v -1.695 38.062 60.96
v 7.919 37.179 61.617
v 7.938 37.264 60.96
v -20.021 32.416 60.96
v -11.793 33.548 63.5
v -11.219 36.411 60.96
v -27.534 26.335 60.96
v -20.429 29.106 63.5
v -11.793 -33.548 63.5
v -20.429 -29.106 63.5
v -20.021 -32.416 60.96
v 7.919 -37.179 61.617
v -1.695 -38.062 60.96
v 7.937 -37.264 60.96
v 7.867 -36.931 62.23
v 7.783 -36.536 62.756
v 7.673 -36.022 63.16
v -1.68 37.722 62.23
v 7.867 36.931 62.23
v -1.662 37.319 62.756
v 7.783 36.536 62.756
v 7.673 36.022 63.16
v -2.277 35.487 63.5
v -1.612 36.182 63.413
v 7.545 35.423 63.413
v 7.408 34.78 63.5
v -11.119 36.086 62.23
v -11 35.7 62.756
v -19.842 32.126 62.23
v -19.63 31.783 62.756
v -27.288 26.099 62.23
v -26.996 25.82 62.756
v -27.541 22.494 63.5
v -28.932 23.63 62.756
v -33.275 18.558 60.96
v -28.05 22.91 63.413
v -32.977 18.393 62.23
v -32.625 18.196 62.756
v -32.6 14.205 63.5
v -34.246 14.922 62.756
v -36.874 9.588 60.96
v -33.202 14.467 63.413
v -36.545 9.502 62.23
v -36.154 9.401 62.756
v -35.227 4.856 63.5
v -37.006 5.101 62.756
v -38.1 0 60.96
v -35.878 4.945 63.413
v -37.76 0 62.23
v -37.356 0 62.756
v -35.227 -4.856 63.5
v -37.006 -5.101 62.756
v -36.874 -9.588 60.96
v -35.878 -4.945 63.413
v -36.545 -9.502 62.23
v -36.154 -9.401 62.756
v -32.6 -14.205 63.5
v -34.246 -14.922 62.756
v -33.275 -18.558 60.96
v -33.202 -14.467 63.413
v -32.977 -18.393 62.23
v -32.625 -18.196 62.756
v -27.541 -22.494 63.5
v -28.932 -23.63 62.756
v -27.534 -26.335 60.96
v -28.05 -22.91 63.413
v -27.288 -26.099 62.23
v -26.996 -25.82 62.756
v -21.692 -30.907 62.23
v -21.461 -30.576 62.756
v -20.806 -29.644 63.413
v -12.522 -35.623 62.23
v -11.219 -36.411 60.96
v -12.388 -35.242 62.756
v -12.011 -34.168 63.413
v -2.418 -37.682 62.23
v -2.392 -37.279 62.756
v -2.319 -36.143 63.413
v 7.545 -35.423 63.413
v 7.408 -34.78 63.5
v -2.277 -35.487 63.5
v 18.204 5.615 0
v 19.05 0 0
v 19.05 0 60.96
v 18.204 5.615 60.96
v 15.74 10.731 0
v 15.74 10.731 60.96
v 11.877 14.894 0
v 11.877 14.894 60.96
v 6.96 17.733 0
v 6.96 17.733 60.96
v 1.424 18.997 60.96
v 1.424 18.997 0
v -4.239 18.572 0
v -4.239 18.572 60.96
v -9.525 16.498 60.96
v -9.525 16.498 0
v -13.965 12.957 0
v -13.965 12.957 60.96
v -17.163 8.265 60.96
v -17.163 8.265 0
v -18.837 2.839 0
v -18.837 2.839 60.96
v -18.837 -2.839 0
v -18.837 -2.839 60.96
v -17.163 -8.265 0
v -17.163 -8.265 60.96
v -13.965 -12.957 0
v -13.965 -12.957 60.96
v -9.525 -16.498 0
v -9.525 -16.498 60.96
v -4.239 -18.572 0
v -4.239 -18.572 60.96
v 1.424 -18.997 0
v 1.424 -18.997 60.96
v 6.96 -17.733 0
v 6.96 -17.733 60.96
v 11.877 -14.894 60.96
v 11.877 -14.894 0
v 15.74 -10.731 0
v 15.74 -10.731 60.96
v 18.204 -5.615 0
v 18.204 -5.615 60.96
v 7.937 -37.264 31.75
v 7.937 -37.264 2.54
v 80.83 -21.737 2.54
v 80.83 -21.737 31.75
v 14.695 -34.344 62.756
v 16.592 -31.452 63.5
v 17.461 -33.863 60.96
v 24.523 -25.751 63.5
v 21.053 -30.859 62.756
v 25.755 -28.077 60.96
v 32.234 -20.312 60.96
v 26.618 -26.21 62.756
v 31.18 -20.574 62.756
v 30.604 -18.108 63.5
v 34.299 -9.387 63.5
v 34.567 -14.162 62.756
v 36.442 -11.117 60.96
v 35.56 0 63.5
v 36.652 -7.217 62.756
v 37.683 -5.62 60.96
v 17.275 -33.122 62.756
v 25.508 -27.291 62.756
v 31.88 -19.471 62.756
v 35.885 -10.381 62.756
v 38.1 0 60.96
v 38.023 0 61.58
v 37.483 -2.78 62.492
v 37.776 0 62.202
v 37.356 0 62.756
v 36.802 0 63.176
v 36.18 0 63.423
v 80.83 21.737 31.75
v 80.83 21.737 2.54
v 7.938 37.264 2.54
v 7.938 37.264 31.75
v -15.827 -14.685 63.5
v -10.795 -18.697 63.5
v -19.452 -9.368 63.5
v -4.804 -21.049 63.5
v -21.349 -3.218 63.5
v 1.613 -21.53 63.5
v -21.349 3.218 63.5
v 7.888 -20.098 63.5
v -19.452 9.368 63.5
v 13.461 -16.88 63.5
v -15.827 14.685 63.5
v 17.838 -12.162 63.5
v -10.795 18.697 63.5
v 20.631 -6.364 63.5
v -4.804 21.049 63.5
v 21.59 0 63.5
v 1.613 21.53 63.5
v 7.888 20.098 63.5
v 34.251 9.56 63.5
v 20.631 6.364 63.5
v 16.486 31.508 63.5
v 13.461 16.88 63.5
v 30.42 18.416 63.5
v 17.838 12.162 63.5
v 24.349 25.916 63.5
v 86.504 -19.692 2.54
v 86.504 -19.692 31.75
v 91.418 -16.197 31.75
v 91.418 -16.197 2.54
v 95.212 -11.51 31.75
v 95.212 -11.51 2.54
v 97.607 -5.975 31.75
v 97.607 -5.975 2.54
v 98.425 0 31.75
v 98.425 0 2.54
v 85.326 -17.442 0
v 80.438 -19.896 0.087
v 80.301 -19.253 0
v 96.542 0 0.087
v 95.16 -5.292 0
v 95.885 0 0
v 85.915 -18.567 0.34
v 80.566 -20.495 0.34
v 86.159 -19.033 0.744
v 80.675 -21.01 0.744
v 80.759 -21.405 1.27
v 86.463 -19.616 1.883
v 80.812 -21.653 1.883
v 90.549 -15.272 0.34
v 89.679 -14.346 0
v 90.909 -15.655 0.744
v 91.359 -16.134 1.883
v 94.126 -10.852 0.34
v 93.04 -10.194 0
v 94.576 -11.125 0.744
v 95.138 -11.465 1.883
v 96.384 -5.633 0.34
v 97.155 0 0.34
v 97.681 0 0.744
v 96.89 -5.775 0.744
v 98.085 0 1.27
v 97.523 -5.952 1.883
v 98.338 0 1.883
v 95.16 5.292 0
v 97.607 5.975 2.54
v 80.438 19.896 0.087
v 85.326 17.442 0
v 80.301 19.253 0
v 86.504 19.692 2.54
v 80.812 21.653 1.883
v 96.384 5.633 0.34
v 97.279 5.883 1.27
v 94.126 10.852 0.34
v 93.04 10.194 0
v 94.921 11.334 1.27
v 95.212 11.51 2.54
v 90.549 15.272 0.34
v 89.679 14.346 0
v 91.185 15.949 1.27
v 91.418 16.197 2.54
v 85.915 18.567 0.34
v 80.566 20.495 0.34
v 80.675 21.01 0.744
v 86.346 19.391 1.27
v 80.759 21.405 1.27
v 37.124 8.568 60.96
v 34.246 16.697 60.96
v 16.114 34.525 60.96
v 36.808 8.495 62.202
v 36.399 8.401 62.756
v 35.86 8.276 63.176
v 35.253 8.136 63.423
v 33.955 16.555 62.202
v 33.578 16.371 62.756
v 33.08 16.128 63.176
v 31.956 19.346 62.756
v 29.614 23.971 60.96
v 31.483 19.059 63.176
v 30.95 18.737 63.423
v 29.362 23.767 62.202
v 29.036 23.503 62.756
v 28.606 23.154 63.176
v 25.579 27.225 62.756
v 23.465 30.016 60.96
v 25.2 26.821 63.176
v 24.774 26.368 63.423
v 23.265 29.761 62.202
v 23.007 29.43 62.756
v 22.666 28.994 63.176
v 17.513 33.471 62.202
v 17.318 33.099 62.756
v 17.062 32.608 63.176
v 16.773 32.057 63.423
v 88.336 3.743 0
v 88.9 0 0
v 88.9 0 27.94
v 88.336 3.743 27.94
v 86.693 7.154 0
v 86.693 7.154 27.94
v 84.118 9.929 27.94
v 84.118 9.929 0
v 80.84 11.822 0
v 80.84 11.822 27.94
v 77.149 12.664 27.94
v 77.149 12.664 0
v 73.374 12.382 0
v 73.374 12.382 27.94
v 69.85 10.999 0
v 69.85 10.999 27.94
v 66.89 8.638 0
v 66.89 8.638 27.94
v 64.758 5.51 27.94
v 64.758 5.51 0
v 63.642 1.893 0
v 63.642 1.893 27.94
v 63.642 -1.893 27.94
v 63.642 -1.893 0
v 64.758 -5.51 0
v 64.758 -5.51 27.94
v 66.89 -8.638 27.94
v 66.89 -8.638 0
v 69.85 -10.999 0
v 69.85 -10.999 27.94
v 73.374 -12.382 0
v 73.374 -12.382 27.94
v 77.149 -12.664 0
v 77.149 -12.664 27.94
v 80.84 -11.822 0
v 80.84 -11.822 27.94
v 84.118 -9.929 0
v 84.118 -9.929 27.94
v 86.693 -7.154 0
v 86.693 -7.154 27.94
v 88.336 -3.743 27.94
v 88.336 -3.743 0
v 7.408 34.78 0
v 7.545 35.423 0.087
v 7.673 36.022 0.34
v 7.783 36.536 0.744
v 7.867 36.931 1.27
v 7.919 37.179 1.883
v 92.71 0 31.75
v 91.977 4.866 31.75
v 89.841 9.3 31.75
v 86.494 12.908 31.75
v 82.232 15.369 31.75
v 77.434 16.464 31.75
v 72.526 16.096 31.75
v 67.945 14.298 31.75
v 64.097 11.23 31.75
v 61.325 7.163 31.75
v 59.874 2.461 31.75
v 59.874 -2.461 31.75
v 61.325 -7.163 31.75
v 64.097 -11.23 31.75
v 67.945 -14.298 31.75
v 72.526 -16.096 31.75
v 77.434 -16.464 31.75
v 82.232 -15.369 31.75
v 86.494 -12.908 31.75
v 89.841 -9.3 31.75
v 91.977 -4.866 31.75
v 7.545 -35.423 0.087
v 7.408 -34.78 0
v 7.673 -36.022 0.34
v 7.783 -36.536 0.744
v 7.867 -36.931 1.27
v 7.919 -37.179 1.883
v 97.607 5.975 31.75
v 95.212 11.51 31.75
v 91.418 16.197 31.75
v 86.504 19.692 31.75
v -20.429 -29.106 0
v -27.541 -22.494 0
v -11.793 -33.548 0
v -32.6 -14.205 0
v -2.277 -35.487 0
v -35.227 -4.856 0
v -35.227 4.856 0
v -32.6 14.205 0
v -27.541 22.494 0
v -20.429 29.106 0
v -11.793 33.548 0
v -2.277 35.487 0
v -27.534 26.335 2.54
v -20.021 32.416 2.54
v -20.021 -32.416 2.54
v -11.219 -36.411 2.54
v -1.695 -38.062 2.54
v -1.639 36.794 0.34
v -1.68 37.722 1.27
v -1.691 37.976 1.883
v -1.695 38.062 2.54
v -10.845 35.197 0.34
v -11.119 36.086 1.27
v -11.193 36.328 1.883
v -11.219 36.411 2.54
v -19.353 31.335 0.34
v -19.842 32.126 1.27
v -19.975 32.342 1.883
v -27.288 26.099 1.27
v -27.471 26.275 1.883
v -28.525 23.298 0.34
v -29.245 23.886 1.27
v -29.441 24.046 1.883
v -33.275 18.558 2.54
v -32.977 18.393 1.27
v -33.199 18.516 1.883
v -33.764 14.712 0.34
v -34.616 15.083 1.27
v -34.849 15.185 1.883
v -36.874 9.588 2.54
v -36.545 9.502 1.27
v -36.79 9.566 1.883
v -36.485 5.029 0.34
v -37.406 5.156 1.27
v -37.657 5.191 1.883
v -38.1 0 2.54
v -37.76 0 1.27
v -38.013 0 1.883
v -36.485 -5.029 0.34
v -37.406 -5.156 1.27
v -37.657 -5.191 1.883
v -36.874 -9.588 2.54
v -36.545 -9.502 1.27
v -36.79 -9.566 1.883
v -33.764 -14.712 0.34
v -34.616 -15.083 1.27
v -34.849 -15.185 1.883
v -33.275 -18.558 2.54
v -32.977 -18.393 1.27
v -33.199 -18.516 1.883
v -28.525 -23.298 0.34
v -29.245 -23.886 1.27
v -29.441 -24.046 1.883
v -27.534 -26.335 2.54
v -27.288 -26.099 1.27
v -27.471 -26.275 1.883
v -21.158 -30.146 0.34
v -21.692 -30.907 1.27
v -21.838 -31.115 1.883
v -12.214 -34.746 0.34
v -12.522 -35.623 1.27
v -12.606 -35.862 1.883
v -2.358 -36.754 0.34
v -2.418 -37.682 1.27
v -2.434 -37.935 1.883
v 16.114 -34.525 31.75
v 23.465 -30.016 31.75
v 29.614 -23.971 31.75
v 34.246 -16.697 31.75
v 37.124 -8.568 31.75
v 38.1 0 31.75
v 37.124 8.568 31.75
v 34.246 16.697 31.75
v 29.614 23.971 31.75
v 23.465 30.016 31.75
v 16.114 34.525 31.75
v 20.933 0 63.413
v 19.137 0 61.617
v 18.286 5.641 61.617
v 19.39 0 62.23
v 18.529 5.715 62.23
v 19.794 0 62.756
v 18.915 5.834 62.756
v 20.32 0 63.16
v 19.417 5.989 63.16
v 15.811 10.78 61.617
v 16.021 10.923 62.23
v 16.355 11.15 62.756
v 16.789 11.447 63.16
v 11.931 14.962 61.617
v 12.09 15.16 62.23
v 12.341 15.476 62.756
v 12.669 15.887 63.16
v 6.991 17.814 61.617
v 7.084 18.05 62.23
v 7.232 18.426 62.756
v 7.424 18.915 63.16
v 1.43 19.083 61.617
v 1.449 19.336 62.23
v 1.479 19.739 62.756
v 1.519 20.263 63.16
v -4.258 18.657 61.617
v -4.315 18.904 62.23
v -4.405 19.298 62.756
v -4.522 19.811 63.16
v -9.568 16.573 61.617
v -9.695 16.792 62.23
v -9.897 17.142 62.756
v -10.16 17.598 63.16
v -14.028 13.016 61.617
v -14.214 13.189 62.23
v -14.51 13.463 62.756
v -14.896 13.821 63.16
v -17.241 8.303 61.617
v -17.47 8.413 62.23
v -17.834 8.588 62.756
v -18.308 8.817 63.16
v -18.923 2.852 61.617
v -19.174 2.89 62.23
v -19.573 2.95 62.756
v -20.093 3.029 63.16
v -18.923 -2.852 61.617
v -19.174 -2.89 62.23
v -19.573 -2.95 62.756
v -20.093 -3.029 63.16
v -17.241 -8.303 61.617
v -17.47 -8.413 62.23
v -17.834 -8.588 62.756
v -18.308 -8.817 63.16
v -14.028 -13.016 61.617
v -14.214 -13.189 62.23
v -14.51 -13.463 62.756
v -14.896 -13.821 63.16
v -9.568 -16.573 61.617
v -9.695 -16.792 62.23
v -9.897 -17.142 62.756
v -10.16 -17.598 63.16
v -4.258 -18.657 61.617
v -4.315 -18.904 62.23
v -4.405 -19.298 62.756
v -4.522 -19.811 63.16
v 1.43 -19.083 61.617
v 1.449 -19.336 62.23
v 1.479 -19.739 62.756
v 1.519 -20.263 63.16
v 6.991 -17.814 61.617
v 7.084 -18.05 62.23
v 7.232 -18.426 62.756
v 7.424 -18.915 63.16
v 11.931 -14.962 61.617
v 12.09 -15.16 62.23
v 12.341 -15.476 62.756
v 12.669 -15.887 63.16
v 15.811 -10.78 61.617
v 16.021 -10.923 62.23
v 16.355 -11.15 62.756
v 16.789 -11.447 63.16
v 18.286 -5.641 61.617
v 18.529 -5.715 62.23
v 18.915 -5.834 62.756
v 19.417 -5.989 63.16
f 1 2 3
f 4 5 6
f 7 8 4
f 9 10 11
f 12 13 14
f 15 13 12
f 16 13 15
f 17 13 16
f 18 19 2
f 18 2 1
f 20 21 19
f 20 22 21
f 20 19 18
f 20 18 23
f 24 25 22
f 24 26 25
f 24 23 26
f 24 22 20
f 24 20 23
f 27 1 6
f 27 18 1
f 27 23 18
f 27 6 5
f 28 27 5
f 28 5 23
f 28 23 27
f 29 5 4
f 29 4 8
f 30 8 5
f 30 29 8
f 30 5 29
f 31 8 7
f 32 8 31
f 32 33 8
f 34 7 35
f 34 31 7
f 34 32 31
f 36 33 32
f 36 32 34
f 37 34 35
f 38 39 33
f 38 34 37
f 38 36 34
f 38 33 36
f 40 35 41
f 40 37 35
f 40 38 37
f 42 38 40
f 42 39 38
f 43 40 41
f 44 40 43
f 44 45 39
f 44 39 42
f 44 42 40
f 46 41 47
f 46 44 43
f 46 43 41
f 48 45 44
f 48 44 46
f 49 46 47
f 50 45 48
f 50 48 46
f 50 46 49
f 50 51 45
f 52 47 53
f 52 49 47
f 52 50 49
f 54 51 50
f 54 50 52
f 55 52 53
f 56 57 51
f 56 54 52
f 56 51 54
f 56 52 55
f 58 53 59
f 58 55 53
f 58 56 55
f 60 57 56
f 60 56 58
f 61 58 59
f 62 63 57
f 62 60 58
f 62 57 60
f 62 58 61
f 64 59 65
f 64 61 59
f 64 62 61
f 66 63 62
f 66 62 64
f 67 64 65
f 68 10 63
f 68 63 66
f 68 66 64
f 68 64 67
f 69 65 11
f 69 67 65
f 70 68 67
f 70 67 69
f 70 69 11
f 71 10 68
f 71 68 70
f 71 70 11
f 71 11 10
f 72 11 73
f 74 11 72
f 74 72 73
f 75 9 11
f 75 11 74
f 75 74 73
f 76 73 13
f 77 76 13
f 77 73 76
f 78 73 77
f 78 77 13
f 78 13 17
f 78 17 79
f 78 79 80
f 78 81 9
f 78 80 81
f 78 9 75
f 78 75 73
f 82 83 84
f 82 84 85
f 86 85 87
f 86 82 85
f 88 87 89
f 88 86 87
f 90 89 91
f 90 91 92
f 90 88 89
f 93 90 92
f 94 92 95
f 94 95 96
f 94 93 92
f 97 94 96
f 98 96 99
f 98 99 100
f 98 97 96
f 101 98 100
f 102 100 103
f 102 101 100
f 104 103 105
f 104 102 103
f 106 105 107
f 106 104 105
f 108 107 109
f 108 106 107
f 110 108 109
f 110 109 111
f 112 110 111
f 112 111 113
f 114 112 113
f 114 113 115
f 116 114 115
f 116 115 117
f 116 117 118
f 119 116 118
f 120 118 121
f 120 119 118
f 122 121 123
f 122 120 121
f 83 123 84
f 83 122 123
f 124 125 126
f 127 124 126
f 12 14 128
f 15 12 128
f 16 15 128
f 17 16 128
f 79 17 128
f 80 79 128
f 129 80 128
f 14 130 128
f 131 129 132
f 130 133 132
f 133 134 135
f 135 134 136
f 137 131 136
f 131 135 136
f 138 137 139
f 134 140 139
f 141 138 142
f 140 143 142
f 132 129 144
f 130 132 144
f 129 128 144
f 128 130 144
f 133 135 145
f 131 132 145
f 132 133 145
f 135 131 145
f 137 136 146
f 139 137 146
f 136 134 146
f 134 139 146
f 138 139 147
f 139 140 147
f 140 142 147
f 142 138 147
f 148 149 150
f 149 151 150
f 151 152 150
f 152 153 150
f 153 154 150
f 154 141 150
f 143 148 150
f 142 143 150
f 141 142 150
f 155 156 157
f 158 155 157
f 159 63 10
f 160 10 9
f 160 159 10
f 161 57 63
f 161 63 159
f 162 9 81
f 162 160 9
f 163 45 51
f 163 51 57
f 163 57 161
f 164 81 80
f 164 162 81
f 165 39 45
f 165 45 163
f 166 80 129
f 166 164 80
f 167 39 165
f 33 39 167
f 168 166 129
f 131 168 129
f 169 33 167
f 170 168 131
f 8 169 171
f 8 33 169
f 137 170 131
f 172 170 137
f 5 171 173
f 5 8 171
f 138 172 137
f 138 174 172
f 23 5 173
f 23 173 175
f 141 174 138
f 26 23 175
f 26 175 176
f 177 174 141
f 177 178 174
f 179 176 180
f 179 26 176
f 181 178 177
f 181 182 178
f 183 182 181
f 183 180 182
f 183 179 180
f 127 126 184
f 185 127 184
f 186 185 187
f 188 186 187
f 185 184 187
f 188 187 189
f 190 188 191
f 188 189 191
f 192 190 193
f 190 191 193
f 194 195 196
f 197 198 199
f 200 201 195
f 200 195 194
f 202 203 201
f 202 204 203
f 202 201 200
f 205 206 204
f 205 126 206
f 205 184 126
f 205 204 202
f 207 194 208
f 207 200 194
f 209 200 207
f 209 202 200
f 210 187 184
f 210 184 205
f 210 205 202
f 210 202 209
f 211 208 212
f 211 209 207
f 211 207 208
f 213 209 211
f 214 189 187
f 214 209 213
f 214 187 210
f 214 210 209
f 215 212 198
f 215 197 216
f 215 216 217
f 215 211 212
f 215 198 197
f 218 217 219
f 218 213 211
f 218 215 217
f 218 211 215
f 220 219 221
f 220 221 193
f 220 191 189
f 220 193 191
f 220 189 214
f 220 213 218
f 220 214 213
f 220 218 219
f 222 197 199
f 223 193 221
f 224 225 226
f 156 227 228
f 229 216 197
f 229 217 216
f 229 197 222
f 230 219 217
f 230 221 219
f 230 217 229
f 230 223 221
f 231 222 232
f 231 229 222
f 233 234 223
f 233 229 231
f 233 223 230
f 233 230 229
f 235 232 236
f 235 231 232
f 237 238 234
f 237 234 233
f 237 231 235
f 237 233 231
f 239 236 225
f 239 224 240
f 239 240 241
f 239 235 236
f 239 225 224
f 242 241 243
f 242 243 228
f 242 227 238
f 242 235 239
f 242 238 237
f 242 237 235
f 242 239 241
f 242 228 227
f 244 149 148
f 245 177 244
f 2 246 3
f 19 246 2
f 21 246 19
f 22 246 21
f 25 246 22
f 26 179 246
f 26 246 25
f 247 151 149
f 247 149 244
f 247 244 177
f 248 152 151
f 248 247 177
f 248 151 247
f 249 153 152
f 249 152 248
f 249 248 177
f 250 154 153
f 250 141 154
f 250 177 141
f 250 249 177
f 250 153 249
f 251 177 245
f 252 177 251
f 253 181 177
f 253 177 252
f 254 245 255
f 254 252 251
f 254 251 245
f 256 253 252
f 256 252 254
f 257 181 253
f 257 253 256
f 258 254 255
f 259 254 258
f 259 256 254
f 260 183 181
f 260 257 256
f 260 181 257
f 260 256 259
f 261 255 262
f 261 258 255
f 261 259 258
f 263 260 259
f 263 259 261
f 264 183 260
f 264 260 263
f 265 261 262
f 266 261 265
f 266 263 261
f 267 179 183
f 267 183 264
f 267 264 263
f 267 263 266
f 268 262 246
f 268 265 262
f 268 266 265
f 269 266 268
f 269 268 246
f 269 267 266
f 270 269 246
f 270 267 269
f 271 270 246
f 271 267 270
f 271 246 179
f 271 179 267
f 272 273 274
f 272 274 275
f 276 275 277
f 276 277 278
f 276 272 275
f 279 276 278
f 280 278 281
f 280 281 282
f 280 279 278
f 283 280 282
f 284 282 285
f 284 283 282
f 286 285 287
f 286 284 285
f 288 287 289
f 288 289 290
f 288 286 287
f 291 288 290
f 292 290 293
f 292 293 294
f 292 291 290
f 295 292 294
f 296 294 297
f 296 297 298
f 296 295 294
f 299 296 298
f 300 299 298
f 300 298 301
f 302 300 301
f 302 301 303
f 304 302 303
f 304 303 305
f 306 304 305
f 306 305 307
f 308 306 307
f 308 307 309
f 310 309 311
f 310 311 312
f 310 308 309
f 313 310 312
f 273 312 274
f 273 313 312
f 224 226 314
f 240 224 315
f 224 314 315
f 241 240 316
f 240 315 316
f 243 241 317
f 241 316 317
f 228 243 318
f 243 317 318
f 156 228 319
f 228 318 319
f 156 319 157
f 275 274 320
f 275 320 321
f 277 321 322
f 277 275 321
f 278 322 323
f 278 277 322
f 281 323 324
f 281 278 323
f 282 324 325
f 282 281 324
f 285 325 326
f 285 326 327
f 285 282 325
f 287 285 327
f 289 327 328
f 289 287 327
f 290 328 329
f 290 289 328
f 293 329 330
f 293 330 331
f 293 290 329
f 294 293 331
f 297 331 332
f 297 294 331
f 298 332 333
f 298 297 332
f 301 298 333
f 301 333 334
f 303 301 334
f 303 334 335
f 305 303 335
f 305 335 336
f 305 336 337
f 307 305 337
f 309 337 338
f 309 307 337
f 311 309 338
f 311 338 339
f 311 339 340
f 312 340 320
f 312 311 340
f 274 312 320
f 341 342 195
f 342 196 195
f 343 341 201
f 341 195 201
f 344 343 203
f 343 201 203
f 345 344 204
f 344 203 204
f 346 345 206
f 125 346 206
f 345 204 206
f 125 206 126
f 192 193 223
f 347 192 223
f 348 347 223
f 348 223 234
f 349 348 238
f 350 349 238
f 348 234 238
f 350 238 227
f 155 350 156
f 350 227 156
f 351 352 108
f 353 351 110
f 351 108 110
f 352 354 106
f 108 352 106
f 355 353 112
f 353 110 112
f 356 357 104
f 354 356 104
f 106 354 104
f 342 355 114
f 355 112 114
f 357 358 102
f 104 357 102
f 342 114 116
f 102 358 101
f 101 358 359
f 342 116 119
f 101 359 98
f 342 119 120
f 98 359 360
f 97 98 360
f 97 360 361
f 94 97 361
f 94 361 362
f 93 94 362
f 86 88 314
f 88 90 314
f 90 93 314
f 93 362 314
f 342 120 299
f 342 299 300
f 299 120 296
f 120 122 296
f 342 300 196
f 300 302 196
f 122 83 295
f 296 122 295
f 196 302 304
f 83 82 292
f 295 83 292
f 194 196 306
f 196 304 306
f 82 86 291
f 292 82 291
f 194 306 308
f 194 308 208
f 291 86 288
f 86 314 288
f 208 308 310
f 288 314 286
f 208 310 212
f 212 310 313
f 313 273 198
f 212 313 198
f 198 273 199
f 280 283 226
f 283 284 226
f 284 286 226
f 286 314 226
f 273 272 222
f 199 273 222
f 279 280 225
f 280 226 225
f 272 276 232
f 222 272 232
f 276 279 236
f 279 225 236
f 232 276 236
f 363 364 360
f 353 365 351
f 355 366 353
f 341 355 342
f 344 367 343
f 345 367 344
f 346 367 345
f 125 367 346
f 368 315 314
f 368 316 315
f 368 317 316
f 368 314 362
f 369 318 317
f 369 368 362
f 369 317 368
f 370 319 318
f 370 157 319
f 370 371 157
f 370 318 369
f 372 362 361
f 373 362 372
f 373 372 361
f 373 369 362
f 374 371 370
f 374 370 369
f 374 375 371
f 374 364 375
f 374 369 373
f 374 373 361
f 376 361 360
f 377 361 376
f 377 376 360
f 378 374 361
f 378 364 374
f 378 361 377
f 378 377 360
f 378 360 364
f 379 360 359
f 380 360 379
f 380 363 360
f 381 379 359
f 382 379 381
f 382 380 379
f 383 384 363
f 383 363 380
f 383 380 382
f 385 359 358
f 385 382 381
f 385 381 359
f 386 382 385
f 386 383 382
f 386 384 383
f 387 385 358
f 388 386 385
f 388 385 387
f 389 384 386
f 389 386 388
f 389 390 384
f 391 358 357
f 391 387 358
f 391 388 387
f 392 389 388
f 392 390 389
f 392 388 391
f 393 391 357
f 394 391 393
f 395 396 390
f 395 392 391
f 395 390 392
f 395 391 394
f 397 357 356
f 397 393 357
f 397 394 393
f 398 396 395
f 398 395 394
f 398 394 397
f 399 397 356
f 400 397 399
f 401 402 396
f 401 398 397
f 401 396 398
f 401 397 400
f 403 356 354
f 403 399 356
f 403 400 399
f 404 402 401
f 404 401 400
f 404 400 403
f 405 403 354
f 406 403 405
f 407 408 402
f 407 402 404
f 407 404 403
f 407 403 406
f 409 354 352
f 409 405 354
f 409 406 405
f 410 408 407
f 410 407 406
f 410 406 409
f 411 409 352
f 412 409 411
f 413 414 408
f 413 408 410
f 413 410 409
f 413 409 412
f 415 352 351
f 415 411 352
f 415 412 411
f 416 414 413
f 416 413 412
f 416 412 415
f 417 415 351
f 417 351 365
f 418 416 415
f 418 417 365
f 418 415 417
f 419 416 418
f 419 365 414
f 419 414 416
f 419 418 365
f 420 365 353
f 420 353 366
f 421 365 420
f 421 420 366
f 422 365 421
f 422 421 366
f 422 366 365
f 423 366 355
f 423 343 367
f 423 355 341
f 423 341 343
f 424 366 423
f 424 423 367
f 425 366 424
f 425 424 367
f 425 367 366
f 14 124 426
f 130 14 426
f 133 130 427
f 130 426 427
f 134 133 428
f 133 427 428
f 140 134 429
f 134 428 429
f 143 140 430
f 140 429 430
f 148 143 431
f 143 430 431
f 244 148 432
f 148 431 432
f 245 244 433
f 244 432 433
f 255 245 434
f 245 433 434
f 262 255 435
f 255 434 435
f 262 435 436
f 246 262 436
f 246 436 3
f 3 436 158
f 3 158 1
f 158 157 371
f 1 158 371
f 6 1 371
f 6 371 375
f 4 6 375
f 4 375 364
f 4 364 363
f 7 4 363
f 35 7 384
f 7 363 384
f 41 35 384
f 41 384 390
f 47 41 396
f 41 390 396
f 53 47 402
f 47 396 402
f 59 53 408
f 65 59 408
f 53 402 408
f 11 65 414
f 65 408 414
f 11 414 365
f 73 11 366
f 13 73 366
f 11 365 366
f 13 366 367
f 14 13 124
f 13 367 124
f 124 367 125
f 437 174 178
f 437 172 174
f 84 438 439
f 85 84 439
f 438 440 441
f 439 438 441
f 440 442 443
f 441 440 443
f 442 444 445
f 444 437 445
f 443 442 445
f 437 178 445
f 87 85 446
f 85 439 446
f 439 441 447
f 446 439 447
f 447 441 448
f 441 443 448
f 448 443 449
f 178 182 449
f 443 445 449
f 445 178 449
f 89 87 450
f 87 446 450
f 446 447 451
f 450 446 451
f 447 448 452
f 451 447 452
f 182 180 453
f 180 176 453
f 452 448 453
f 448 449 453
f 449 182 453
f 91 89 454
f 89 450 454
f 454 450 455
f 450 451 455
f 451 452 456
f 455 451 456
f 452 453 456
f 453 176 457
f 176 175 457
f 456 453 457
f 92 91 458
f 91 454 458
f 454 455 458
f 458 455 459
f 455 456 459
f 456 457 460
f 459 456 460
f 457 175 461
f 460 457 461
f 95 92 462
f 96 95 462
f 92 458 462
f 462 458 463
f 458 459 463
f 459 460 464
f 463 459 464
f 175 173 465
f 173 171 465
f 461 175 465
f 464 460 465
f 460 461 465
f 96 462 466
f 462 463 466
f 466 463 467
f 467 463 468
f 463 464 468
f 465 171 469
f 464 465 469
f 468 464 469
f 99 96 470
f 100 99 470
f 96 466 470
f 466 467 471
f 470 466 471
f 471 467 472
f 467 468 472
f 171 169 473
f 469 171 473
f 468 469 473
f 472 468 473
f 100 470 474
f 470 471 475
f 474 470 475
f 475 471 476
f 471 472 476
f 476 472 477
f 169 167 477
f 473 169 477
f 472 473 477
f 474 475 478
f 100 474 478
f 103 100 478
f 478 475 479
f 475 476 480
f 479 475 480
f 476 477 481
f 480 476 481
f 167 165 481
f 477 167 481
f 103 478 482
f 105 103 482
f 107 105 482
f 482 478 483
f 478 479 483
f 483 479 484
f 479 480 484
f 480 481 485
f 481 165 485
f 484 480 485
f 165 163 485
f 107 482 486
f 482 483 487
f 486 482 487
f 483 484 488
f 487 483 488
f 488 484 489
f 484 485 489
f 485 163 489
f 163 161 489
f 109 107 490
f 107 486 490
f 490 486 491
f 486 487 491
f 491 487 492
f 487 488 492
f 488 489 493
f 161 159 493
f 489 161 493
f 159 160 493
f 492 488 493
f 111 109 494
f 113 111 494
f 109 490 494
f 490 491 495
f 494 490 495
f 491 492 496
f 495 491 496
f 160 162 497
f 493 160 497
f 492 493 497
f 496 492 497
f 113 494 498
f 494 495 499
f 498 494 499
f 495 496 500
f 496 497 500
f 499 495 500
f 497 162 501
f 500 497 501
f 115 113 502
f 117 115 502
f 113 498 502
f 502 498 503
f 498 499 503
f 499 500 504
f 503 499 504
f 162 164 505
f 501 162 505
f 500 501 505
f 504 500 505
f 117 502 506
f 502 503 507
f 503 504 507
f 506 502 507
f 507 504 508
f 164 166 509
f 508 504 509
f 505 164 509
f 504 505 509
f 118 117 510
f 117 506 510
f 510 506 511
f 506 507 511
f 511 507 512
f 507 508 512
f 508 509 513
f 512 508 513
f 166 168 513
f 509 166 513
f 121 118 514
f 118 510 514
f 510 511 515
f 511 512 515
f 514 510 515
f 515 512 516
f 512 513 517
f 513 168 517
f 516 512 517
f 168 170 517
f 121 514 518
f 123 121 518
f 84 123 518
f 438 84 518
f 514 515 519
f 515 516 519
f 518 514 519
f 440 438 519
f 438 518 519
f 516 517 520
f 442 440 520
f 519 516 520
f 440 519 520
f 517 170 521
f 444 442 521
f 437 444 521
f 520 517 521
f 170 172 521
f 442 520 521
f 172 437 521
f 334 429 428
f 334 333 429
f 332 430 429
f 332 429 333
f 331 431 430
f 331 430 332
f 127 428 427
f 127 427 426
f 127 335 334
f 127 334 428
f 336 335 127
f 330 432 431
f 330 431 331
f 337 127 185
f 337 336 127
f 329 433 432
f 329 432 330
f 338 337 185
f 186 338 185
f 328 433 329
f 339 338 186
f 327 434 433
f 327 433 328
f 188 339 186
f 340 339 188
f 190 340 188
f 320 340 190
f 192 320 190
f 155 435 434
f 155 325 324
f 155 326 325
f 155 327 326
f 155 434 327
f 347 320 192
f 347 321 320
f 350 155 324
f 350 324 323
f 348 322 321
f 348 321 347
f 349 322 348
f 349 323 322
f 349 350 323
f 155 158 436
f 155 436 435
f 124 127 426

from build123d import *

# Parameters (mm, degrees)
F0_R     = 19.05
F0_R_2   = 12.7
F1_DEPTH = 31.75
F2_DEPTH = 63.5
F3_R     = 2.54
F4_SIZE  = 3.81


with BuildPart() as f1:
    # F0 (on Top) → F1 (new body)
    with BuildSketch(Plane.XY):
        with BuildLine():
            ThreePointArc((7.9375, -37.2640053369), (29.6144284936, -23.970724332), (38.1, 0))
            ThreePointArc((38.1, 0), (29.6144284936, 23.970724332), (7.9375, 37.2640053369))
            ThreePointArc((7.9375, 37.2640053369), (-38.1, 0), (7.9375, -37.2640053369))
        make_face()
        Circle(F0_R, mode=Mode.SUBTRACT)
        with BuildLine():
            ThreePointArc((7.9375, 37.2640053369), (29.6144284936, 23.970724332), (38.1, 0))
            ThreePointArc((38.1, 0), (29.6144284936, -23.970724332), (7.9375, -37.2640053369))
            Line((7.9375, -37.2640053369), (80.8302083333, -21.7373364465))
            ThreePointArc((80.8302083333, -21.7373364465), (53.975, 0), (80.8302083333, 21.7373364465))
            Line((80.8302083333, 21.7373364465), (7.9375, 37.2640053369))
        make_face()
        with BuildLine():
            ThreePointArc((98.425, 0), (93.4750832879, 13.982922527), (80.8302083333, 21.7373364465))
            ThreePointArc((80.8302083333, 21.7373364465), (53.975, 0), (80.8302083333, -21.7373364465))
            ThreePointArc((80.8302083333, -21.7373364465), (93.4750832879, -13.982922527), (98.425, 0))
        make_face()
        with Locations((76.2, 0)):
            Circle(F0_R_2, mode=Mode.SUBTRACT)
    extrude(amount=F1_DEPTH)

    # F0 (on Top) → F2 (join)
    with BuildSketch(Plane.XY):
        with BuildLine():
            ThreePointArc((7.9375, -37.2640053369), (29.6144284936, -23.970724332), (38.1, 0))
            ThreePointArc((38.1, 0), (29.6144284936, 23.970724332), (7.9375, 37.2640053369))
            ThreePointArc((7.9375, 37.2640053369), (-38.1, 0), (7.9375, -37.2640053369))
        make_face()
        Circle(F0_R, mode=Mode.SUBTRACT)
    extrude(amount=F2_DEPTH)

    # F3
    f3_edges = [f1.edges().sort_by_distance(p)[0] for p in [
        (-7.9375, 37.264005, 63.5),
        (-19.05, 0, 63.5),
        (44.383854, -29.500671, 0),
    ]]
    fillet(f3_edges, radius=F3_R)

    # F4
    f4_edges = [f1.edges().sort_by_distance(p)[0] for p in [
        (-21.59, 0, 63.5),
        (63.5, 0, 31.75),
    ]]
    chamfer(f4_edges, length=F4_SIZE)


solid = f1.part
